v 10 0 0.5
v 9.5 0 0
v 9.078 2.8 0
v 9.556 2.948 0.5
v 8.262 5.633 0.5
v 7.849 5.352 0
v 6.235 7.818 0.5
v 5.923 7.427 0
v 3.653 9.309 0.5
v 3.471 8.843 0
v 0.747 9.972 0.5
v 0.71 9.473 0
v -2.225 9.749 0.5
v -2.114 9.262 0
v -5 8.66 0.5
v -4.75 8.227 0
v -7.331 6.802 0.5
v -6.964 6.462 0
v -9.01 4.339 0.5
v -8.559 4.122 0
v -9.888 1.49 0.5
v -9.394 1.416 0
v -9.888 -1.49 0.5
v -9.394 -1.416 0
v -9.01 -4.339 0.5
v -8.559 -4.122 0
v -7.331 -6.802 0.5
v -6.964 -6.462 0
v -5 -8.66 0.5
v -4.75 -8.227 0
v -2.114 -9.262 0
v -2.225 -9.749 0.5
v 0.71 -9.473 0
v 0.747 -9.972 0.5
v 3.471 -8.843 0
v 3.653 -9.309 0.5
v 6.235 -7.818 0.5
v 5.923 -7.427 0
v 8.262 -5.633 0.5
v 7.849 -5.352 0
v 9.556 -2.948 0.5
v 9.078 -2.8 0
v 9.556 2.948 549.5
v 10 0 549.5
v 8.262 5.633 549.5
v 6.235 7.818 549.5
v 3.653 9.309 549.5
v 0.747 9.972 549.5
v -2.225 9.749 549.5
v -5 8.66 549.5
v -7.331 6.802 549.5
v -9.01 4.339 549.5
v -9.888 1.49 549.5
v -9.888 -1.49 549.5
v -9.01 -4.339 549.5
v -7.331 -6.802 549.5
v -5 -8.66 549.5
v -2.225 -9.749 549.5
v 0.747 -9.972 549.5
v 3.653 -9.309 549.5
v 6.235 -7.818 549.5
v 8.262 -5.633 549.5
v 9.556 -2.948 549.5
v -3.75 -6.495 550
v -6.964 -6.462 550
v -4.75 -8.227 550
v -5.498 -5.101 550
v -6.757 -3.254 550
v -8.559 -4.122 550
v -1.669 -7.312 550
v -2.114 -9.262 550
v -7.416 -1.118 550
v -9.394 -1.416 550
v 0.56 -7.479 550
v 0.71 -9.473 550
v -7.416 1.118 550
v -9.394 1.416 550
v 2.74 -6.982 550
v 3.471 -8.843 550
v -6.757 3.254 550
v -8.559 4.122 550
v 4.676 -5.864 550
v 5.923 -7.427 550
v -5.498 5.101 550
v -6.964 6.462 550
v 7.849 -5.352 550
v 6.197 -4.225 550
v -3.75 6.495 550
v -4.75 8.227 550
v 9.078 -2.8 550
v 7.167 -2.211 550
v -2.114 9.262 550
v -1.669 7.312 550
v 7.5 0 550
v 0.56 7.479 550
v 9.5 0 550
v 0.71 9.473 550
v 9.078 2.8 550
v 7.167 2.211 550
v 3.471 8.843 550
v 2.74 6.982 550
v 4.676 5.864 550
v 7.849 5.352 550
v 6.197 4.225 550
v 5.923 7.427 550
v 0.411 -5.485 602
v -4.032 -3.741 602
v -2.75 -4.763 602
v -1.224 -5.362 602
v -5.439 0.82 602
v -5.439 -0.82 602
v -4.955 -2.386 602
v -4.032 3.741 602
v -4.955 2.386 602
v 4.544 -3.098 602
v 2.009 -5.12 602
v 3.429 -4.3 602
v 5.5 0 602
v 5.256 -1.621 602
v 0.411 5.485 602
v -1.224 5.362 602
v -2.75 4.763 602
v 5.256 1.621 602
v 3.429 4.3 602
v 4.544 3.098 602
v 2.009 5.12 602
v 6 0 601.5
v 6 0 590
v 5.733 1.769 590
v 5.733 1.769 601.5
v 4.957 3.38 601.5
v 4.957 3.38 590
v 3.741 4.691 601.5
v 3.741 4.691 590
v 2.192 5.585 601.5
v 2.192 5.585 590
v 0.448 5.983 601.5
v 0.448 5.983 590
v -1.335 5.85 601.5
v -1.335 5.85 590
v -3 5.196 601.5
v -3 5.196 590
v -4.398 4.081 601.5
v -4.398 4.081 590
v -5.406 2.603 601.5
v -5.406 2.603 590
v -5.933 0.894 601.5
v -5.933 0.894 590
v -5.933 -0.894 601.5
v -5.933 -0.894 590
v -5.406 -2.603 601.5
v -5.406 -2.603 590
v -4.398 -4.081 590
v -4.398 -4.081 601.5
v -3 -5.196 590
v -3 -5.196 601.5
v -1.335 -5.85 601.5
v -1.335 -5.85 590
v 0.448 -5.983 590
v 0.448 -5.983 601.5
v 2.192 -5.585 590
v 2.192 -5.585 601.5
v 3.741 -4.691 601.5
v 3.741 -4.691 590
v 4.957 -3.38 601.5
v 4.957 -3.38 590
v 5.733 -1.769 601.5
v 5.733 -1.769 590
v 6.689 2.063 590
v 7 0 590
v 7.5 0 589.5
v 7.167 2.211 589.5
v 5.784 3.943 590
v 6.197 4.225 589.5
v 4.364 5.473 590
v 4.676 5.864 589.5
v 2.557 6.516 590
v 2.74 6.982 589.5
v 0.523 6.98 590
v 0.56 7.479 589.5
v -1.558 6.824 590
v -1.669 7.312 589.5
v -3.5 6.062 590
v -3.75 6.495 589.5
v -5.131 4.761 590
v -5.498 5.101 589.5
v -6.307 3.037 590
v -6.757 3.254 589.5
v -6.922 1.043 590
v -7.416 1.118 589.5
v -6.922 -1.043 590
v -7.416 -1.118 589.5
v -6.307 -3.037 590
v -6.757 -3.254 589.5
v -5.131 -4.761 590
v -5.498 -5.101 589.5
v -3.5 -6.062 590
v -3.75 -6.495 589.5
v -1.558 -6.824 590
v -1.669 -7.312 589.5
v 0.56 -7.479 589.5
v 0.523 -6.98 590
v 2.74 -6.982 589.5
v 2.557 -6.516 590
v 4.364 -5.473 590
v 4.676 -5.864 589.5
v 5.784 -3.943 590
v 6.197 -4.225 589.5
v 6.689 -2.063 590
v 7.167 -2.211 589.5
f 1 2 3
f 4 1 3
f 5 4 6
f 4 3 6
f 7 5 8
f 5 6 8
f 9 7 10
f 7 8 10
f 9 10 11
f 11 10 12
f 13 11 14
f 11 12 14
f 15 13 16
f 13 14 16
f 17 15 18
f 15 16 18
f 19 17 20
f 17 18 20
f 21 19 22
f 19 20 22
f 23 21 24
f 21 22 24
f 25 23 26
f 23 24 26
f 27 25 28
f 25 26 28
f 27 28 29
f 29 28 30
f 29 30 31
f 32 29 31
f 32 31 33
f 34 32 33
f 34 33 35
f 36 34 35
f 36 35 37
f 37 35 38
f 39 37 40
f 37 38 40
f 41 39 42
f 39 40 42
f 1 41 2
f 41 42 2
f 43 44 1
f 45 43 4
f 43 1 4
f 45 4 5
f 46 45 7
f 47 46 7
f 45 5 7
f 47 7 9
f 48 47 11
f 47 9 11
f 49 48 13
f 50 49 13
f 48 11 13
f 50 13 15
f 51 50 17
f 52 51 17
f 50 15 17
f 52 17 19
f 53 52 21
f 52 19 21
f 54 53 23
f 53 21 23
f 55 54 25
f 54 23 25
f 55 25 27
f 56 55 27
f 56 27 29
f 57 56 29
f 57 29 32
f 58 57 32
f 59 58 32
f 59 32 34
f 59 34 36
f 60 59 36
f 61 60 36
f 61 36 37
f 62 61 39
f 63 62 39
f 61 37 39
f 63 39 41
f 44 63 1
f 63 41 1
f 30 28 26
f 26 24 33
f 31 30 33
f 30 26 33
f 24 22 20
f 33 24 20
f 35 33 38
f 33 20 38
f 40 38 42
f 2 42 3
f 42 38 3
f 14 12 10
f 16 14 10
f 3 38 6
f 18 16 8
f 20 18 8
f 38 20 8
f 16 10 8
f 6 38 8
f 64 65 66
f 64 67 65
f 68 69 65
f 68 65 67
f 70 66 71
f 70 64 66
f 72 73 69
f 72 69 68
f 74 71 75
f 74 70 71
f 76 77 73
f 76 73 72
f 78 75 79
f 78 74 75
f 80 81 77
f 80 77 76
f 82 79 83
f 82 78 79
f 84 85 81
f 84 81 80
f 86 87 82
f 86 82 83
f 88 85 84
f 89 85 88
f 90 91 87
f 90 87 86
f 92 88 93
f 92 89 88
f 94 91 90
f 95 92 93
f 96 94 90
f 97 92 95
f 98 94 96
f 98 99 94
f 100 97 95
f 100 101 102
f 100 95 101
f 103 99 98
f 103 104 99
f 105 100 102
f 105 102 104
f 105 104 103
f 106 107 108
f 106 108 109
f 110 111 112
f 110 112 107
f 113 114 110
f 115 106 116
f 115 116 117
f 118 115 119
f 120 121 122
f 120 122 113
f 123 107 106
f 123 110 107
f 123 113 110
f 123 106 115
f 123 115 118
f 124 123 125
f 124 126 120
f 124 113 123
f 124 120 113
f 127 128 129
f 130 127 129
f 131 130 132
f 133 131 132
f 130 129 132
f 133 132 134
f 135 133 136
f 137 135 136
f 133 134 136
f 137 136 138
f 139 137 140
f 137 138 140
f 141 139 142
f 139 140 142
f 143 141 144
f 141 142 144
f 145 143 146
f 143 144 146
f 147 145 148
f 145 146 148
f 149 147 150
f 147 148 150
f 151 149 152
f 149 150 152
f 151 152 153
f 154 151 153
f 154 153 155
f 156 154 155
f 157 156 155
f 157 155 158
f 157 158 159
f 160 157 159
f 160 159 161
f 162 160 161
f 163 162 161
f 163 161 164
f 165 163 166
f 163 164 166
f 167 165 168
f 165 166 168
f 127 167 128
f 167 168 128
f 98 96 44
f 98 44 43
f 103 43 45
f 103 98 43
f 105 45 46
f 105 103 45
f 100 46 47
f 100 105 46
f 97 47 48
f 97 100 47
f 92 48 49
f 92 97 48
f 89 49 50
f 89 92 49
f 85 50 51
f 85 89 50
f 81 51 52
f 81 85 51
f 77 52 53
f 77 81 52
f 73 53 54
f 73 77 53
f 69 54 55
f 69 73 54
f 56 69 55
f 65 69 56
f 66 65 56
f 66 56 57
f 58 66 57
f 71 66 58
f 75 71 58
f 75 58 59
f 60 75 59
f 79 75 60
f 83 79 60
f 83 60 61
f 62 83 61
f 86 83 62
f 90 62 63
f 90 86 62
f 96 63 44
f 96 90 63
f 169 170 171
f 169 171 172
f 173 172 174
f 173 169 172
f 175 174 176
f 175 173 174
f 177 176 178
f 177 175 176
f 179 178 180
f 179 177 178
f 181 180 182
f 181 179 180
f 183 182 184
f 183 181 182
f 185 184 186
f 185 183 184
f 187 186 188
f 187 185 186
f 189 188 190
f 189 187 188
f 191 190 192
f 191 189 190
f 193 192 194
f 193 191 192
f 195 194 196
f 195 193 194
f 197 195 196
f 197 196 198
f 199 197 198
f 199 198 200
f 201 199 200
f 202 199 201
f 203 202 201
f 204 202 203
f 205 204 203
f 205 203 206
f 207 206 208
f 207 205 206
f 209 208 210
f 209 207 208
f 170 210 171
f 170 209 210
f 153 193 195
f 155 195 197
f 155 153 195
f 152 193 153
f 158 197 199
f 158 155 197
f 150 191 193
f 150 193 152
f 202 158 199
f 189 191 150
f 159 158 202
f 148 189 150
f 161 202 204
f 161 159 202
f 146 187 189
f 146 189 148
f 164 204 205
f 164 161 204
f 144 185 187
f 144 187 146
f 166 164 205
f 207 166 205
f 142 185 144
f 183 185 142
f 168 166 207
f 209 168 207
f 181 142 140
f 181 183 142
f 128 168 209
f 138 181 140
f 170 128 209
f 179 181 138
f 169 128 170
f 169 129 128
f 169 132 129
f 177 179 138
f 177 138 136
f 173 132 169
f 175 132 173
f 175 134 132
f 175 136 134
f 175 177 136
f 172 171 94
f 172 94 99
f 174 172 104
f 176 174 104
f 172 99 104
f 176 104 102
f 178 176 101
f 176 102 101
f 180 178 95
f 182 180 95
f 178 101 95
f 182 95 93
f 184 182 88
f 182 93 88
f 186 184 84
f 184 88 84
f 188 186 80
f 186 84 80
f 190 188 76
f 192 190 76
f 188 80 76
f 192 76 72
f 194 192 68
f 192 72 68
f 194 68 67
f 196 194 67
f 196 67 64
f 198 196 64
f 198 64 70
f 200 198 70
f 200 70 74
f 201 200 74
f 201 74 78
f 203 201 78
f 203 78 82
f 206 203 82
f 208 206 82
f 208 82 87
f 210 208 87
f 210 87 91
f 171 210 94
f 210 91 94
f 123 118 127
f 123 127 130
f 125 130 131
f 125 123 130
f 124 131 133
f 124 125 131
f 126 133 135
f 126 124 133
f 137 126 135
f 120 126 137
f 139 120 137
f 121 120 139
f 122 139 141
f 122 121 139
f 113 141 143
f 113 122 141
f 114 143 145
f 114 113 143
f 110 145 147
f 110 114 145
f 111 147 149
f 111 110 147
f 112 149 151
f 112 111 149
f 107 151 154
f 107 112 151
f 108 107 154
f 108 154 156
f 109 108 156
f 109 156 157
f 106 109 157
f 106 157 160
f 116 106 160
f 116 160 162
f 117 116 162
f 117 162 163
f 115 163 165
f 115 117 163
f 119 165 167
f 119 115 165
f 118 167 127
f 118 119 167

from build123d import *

# Parameters (mm, degrees)
SKETCH1_R           = 10
BOSS_EXTRUDE1_DEPTH = 550
SKETCH4_R           = 7.5
BOSS_EXTRUDE2_DEPTH = 40
SKETCH5_R           = 6
BOSS_EXTRUDE3_DEPTH = 12
CHAMFER1_SIZE       = 0.5


with BuildPart() as part:
    # Sketch1 → Boss-Extrude1 (new body)
    with BuildSketch(Plane.XY):
        Circle(SKETCH1_R)
    extrude(amount=BOSS_EXTRUDE1_DEPTH)

    # Sketch4 → Boss-Extrude2 (add)
    with BuildSketch(Plane.XY.offset(550)):
        Circle(SKETCH4_R)
    extrude(amount=BOSS_EXTRUDE2_DEPTH)

    # Sketch5 → Boss-Extrude3 (add)
    with BuildSketch(Plane.XY.offset(590)):
        Circle(SKETCH5_R)
    extrude(amount=BOSS_EXTRUDE3_DEPTH)

    # Chamfer1
    chamfer1_edges = [part.edges().sort_by_distance(p)[0] for p in [
        (-6, 0, 602),
        (-10, 0, 0),
        (-10, 0, 550),
        (-7.5, 0, 590),
    ]]
    chamfer(chamfer1_edges, length=CHAMFER1_SIZE)


solid = part.part
